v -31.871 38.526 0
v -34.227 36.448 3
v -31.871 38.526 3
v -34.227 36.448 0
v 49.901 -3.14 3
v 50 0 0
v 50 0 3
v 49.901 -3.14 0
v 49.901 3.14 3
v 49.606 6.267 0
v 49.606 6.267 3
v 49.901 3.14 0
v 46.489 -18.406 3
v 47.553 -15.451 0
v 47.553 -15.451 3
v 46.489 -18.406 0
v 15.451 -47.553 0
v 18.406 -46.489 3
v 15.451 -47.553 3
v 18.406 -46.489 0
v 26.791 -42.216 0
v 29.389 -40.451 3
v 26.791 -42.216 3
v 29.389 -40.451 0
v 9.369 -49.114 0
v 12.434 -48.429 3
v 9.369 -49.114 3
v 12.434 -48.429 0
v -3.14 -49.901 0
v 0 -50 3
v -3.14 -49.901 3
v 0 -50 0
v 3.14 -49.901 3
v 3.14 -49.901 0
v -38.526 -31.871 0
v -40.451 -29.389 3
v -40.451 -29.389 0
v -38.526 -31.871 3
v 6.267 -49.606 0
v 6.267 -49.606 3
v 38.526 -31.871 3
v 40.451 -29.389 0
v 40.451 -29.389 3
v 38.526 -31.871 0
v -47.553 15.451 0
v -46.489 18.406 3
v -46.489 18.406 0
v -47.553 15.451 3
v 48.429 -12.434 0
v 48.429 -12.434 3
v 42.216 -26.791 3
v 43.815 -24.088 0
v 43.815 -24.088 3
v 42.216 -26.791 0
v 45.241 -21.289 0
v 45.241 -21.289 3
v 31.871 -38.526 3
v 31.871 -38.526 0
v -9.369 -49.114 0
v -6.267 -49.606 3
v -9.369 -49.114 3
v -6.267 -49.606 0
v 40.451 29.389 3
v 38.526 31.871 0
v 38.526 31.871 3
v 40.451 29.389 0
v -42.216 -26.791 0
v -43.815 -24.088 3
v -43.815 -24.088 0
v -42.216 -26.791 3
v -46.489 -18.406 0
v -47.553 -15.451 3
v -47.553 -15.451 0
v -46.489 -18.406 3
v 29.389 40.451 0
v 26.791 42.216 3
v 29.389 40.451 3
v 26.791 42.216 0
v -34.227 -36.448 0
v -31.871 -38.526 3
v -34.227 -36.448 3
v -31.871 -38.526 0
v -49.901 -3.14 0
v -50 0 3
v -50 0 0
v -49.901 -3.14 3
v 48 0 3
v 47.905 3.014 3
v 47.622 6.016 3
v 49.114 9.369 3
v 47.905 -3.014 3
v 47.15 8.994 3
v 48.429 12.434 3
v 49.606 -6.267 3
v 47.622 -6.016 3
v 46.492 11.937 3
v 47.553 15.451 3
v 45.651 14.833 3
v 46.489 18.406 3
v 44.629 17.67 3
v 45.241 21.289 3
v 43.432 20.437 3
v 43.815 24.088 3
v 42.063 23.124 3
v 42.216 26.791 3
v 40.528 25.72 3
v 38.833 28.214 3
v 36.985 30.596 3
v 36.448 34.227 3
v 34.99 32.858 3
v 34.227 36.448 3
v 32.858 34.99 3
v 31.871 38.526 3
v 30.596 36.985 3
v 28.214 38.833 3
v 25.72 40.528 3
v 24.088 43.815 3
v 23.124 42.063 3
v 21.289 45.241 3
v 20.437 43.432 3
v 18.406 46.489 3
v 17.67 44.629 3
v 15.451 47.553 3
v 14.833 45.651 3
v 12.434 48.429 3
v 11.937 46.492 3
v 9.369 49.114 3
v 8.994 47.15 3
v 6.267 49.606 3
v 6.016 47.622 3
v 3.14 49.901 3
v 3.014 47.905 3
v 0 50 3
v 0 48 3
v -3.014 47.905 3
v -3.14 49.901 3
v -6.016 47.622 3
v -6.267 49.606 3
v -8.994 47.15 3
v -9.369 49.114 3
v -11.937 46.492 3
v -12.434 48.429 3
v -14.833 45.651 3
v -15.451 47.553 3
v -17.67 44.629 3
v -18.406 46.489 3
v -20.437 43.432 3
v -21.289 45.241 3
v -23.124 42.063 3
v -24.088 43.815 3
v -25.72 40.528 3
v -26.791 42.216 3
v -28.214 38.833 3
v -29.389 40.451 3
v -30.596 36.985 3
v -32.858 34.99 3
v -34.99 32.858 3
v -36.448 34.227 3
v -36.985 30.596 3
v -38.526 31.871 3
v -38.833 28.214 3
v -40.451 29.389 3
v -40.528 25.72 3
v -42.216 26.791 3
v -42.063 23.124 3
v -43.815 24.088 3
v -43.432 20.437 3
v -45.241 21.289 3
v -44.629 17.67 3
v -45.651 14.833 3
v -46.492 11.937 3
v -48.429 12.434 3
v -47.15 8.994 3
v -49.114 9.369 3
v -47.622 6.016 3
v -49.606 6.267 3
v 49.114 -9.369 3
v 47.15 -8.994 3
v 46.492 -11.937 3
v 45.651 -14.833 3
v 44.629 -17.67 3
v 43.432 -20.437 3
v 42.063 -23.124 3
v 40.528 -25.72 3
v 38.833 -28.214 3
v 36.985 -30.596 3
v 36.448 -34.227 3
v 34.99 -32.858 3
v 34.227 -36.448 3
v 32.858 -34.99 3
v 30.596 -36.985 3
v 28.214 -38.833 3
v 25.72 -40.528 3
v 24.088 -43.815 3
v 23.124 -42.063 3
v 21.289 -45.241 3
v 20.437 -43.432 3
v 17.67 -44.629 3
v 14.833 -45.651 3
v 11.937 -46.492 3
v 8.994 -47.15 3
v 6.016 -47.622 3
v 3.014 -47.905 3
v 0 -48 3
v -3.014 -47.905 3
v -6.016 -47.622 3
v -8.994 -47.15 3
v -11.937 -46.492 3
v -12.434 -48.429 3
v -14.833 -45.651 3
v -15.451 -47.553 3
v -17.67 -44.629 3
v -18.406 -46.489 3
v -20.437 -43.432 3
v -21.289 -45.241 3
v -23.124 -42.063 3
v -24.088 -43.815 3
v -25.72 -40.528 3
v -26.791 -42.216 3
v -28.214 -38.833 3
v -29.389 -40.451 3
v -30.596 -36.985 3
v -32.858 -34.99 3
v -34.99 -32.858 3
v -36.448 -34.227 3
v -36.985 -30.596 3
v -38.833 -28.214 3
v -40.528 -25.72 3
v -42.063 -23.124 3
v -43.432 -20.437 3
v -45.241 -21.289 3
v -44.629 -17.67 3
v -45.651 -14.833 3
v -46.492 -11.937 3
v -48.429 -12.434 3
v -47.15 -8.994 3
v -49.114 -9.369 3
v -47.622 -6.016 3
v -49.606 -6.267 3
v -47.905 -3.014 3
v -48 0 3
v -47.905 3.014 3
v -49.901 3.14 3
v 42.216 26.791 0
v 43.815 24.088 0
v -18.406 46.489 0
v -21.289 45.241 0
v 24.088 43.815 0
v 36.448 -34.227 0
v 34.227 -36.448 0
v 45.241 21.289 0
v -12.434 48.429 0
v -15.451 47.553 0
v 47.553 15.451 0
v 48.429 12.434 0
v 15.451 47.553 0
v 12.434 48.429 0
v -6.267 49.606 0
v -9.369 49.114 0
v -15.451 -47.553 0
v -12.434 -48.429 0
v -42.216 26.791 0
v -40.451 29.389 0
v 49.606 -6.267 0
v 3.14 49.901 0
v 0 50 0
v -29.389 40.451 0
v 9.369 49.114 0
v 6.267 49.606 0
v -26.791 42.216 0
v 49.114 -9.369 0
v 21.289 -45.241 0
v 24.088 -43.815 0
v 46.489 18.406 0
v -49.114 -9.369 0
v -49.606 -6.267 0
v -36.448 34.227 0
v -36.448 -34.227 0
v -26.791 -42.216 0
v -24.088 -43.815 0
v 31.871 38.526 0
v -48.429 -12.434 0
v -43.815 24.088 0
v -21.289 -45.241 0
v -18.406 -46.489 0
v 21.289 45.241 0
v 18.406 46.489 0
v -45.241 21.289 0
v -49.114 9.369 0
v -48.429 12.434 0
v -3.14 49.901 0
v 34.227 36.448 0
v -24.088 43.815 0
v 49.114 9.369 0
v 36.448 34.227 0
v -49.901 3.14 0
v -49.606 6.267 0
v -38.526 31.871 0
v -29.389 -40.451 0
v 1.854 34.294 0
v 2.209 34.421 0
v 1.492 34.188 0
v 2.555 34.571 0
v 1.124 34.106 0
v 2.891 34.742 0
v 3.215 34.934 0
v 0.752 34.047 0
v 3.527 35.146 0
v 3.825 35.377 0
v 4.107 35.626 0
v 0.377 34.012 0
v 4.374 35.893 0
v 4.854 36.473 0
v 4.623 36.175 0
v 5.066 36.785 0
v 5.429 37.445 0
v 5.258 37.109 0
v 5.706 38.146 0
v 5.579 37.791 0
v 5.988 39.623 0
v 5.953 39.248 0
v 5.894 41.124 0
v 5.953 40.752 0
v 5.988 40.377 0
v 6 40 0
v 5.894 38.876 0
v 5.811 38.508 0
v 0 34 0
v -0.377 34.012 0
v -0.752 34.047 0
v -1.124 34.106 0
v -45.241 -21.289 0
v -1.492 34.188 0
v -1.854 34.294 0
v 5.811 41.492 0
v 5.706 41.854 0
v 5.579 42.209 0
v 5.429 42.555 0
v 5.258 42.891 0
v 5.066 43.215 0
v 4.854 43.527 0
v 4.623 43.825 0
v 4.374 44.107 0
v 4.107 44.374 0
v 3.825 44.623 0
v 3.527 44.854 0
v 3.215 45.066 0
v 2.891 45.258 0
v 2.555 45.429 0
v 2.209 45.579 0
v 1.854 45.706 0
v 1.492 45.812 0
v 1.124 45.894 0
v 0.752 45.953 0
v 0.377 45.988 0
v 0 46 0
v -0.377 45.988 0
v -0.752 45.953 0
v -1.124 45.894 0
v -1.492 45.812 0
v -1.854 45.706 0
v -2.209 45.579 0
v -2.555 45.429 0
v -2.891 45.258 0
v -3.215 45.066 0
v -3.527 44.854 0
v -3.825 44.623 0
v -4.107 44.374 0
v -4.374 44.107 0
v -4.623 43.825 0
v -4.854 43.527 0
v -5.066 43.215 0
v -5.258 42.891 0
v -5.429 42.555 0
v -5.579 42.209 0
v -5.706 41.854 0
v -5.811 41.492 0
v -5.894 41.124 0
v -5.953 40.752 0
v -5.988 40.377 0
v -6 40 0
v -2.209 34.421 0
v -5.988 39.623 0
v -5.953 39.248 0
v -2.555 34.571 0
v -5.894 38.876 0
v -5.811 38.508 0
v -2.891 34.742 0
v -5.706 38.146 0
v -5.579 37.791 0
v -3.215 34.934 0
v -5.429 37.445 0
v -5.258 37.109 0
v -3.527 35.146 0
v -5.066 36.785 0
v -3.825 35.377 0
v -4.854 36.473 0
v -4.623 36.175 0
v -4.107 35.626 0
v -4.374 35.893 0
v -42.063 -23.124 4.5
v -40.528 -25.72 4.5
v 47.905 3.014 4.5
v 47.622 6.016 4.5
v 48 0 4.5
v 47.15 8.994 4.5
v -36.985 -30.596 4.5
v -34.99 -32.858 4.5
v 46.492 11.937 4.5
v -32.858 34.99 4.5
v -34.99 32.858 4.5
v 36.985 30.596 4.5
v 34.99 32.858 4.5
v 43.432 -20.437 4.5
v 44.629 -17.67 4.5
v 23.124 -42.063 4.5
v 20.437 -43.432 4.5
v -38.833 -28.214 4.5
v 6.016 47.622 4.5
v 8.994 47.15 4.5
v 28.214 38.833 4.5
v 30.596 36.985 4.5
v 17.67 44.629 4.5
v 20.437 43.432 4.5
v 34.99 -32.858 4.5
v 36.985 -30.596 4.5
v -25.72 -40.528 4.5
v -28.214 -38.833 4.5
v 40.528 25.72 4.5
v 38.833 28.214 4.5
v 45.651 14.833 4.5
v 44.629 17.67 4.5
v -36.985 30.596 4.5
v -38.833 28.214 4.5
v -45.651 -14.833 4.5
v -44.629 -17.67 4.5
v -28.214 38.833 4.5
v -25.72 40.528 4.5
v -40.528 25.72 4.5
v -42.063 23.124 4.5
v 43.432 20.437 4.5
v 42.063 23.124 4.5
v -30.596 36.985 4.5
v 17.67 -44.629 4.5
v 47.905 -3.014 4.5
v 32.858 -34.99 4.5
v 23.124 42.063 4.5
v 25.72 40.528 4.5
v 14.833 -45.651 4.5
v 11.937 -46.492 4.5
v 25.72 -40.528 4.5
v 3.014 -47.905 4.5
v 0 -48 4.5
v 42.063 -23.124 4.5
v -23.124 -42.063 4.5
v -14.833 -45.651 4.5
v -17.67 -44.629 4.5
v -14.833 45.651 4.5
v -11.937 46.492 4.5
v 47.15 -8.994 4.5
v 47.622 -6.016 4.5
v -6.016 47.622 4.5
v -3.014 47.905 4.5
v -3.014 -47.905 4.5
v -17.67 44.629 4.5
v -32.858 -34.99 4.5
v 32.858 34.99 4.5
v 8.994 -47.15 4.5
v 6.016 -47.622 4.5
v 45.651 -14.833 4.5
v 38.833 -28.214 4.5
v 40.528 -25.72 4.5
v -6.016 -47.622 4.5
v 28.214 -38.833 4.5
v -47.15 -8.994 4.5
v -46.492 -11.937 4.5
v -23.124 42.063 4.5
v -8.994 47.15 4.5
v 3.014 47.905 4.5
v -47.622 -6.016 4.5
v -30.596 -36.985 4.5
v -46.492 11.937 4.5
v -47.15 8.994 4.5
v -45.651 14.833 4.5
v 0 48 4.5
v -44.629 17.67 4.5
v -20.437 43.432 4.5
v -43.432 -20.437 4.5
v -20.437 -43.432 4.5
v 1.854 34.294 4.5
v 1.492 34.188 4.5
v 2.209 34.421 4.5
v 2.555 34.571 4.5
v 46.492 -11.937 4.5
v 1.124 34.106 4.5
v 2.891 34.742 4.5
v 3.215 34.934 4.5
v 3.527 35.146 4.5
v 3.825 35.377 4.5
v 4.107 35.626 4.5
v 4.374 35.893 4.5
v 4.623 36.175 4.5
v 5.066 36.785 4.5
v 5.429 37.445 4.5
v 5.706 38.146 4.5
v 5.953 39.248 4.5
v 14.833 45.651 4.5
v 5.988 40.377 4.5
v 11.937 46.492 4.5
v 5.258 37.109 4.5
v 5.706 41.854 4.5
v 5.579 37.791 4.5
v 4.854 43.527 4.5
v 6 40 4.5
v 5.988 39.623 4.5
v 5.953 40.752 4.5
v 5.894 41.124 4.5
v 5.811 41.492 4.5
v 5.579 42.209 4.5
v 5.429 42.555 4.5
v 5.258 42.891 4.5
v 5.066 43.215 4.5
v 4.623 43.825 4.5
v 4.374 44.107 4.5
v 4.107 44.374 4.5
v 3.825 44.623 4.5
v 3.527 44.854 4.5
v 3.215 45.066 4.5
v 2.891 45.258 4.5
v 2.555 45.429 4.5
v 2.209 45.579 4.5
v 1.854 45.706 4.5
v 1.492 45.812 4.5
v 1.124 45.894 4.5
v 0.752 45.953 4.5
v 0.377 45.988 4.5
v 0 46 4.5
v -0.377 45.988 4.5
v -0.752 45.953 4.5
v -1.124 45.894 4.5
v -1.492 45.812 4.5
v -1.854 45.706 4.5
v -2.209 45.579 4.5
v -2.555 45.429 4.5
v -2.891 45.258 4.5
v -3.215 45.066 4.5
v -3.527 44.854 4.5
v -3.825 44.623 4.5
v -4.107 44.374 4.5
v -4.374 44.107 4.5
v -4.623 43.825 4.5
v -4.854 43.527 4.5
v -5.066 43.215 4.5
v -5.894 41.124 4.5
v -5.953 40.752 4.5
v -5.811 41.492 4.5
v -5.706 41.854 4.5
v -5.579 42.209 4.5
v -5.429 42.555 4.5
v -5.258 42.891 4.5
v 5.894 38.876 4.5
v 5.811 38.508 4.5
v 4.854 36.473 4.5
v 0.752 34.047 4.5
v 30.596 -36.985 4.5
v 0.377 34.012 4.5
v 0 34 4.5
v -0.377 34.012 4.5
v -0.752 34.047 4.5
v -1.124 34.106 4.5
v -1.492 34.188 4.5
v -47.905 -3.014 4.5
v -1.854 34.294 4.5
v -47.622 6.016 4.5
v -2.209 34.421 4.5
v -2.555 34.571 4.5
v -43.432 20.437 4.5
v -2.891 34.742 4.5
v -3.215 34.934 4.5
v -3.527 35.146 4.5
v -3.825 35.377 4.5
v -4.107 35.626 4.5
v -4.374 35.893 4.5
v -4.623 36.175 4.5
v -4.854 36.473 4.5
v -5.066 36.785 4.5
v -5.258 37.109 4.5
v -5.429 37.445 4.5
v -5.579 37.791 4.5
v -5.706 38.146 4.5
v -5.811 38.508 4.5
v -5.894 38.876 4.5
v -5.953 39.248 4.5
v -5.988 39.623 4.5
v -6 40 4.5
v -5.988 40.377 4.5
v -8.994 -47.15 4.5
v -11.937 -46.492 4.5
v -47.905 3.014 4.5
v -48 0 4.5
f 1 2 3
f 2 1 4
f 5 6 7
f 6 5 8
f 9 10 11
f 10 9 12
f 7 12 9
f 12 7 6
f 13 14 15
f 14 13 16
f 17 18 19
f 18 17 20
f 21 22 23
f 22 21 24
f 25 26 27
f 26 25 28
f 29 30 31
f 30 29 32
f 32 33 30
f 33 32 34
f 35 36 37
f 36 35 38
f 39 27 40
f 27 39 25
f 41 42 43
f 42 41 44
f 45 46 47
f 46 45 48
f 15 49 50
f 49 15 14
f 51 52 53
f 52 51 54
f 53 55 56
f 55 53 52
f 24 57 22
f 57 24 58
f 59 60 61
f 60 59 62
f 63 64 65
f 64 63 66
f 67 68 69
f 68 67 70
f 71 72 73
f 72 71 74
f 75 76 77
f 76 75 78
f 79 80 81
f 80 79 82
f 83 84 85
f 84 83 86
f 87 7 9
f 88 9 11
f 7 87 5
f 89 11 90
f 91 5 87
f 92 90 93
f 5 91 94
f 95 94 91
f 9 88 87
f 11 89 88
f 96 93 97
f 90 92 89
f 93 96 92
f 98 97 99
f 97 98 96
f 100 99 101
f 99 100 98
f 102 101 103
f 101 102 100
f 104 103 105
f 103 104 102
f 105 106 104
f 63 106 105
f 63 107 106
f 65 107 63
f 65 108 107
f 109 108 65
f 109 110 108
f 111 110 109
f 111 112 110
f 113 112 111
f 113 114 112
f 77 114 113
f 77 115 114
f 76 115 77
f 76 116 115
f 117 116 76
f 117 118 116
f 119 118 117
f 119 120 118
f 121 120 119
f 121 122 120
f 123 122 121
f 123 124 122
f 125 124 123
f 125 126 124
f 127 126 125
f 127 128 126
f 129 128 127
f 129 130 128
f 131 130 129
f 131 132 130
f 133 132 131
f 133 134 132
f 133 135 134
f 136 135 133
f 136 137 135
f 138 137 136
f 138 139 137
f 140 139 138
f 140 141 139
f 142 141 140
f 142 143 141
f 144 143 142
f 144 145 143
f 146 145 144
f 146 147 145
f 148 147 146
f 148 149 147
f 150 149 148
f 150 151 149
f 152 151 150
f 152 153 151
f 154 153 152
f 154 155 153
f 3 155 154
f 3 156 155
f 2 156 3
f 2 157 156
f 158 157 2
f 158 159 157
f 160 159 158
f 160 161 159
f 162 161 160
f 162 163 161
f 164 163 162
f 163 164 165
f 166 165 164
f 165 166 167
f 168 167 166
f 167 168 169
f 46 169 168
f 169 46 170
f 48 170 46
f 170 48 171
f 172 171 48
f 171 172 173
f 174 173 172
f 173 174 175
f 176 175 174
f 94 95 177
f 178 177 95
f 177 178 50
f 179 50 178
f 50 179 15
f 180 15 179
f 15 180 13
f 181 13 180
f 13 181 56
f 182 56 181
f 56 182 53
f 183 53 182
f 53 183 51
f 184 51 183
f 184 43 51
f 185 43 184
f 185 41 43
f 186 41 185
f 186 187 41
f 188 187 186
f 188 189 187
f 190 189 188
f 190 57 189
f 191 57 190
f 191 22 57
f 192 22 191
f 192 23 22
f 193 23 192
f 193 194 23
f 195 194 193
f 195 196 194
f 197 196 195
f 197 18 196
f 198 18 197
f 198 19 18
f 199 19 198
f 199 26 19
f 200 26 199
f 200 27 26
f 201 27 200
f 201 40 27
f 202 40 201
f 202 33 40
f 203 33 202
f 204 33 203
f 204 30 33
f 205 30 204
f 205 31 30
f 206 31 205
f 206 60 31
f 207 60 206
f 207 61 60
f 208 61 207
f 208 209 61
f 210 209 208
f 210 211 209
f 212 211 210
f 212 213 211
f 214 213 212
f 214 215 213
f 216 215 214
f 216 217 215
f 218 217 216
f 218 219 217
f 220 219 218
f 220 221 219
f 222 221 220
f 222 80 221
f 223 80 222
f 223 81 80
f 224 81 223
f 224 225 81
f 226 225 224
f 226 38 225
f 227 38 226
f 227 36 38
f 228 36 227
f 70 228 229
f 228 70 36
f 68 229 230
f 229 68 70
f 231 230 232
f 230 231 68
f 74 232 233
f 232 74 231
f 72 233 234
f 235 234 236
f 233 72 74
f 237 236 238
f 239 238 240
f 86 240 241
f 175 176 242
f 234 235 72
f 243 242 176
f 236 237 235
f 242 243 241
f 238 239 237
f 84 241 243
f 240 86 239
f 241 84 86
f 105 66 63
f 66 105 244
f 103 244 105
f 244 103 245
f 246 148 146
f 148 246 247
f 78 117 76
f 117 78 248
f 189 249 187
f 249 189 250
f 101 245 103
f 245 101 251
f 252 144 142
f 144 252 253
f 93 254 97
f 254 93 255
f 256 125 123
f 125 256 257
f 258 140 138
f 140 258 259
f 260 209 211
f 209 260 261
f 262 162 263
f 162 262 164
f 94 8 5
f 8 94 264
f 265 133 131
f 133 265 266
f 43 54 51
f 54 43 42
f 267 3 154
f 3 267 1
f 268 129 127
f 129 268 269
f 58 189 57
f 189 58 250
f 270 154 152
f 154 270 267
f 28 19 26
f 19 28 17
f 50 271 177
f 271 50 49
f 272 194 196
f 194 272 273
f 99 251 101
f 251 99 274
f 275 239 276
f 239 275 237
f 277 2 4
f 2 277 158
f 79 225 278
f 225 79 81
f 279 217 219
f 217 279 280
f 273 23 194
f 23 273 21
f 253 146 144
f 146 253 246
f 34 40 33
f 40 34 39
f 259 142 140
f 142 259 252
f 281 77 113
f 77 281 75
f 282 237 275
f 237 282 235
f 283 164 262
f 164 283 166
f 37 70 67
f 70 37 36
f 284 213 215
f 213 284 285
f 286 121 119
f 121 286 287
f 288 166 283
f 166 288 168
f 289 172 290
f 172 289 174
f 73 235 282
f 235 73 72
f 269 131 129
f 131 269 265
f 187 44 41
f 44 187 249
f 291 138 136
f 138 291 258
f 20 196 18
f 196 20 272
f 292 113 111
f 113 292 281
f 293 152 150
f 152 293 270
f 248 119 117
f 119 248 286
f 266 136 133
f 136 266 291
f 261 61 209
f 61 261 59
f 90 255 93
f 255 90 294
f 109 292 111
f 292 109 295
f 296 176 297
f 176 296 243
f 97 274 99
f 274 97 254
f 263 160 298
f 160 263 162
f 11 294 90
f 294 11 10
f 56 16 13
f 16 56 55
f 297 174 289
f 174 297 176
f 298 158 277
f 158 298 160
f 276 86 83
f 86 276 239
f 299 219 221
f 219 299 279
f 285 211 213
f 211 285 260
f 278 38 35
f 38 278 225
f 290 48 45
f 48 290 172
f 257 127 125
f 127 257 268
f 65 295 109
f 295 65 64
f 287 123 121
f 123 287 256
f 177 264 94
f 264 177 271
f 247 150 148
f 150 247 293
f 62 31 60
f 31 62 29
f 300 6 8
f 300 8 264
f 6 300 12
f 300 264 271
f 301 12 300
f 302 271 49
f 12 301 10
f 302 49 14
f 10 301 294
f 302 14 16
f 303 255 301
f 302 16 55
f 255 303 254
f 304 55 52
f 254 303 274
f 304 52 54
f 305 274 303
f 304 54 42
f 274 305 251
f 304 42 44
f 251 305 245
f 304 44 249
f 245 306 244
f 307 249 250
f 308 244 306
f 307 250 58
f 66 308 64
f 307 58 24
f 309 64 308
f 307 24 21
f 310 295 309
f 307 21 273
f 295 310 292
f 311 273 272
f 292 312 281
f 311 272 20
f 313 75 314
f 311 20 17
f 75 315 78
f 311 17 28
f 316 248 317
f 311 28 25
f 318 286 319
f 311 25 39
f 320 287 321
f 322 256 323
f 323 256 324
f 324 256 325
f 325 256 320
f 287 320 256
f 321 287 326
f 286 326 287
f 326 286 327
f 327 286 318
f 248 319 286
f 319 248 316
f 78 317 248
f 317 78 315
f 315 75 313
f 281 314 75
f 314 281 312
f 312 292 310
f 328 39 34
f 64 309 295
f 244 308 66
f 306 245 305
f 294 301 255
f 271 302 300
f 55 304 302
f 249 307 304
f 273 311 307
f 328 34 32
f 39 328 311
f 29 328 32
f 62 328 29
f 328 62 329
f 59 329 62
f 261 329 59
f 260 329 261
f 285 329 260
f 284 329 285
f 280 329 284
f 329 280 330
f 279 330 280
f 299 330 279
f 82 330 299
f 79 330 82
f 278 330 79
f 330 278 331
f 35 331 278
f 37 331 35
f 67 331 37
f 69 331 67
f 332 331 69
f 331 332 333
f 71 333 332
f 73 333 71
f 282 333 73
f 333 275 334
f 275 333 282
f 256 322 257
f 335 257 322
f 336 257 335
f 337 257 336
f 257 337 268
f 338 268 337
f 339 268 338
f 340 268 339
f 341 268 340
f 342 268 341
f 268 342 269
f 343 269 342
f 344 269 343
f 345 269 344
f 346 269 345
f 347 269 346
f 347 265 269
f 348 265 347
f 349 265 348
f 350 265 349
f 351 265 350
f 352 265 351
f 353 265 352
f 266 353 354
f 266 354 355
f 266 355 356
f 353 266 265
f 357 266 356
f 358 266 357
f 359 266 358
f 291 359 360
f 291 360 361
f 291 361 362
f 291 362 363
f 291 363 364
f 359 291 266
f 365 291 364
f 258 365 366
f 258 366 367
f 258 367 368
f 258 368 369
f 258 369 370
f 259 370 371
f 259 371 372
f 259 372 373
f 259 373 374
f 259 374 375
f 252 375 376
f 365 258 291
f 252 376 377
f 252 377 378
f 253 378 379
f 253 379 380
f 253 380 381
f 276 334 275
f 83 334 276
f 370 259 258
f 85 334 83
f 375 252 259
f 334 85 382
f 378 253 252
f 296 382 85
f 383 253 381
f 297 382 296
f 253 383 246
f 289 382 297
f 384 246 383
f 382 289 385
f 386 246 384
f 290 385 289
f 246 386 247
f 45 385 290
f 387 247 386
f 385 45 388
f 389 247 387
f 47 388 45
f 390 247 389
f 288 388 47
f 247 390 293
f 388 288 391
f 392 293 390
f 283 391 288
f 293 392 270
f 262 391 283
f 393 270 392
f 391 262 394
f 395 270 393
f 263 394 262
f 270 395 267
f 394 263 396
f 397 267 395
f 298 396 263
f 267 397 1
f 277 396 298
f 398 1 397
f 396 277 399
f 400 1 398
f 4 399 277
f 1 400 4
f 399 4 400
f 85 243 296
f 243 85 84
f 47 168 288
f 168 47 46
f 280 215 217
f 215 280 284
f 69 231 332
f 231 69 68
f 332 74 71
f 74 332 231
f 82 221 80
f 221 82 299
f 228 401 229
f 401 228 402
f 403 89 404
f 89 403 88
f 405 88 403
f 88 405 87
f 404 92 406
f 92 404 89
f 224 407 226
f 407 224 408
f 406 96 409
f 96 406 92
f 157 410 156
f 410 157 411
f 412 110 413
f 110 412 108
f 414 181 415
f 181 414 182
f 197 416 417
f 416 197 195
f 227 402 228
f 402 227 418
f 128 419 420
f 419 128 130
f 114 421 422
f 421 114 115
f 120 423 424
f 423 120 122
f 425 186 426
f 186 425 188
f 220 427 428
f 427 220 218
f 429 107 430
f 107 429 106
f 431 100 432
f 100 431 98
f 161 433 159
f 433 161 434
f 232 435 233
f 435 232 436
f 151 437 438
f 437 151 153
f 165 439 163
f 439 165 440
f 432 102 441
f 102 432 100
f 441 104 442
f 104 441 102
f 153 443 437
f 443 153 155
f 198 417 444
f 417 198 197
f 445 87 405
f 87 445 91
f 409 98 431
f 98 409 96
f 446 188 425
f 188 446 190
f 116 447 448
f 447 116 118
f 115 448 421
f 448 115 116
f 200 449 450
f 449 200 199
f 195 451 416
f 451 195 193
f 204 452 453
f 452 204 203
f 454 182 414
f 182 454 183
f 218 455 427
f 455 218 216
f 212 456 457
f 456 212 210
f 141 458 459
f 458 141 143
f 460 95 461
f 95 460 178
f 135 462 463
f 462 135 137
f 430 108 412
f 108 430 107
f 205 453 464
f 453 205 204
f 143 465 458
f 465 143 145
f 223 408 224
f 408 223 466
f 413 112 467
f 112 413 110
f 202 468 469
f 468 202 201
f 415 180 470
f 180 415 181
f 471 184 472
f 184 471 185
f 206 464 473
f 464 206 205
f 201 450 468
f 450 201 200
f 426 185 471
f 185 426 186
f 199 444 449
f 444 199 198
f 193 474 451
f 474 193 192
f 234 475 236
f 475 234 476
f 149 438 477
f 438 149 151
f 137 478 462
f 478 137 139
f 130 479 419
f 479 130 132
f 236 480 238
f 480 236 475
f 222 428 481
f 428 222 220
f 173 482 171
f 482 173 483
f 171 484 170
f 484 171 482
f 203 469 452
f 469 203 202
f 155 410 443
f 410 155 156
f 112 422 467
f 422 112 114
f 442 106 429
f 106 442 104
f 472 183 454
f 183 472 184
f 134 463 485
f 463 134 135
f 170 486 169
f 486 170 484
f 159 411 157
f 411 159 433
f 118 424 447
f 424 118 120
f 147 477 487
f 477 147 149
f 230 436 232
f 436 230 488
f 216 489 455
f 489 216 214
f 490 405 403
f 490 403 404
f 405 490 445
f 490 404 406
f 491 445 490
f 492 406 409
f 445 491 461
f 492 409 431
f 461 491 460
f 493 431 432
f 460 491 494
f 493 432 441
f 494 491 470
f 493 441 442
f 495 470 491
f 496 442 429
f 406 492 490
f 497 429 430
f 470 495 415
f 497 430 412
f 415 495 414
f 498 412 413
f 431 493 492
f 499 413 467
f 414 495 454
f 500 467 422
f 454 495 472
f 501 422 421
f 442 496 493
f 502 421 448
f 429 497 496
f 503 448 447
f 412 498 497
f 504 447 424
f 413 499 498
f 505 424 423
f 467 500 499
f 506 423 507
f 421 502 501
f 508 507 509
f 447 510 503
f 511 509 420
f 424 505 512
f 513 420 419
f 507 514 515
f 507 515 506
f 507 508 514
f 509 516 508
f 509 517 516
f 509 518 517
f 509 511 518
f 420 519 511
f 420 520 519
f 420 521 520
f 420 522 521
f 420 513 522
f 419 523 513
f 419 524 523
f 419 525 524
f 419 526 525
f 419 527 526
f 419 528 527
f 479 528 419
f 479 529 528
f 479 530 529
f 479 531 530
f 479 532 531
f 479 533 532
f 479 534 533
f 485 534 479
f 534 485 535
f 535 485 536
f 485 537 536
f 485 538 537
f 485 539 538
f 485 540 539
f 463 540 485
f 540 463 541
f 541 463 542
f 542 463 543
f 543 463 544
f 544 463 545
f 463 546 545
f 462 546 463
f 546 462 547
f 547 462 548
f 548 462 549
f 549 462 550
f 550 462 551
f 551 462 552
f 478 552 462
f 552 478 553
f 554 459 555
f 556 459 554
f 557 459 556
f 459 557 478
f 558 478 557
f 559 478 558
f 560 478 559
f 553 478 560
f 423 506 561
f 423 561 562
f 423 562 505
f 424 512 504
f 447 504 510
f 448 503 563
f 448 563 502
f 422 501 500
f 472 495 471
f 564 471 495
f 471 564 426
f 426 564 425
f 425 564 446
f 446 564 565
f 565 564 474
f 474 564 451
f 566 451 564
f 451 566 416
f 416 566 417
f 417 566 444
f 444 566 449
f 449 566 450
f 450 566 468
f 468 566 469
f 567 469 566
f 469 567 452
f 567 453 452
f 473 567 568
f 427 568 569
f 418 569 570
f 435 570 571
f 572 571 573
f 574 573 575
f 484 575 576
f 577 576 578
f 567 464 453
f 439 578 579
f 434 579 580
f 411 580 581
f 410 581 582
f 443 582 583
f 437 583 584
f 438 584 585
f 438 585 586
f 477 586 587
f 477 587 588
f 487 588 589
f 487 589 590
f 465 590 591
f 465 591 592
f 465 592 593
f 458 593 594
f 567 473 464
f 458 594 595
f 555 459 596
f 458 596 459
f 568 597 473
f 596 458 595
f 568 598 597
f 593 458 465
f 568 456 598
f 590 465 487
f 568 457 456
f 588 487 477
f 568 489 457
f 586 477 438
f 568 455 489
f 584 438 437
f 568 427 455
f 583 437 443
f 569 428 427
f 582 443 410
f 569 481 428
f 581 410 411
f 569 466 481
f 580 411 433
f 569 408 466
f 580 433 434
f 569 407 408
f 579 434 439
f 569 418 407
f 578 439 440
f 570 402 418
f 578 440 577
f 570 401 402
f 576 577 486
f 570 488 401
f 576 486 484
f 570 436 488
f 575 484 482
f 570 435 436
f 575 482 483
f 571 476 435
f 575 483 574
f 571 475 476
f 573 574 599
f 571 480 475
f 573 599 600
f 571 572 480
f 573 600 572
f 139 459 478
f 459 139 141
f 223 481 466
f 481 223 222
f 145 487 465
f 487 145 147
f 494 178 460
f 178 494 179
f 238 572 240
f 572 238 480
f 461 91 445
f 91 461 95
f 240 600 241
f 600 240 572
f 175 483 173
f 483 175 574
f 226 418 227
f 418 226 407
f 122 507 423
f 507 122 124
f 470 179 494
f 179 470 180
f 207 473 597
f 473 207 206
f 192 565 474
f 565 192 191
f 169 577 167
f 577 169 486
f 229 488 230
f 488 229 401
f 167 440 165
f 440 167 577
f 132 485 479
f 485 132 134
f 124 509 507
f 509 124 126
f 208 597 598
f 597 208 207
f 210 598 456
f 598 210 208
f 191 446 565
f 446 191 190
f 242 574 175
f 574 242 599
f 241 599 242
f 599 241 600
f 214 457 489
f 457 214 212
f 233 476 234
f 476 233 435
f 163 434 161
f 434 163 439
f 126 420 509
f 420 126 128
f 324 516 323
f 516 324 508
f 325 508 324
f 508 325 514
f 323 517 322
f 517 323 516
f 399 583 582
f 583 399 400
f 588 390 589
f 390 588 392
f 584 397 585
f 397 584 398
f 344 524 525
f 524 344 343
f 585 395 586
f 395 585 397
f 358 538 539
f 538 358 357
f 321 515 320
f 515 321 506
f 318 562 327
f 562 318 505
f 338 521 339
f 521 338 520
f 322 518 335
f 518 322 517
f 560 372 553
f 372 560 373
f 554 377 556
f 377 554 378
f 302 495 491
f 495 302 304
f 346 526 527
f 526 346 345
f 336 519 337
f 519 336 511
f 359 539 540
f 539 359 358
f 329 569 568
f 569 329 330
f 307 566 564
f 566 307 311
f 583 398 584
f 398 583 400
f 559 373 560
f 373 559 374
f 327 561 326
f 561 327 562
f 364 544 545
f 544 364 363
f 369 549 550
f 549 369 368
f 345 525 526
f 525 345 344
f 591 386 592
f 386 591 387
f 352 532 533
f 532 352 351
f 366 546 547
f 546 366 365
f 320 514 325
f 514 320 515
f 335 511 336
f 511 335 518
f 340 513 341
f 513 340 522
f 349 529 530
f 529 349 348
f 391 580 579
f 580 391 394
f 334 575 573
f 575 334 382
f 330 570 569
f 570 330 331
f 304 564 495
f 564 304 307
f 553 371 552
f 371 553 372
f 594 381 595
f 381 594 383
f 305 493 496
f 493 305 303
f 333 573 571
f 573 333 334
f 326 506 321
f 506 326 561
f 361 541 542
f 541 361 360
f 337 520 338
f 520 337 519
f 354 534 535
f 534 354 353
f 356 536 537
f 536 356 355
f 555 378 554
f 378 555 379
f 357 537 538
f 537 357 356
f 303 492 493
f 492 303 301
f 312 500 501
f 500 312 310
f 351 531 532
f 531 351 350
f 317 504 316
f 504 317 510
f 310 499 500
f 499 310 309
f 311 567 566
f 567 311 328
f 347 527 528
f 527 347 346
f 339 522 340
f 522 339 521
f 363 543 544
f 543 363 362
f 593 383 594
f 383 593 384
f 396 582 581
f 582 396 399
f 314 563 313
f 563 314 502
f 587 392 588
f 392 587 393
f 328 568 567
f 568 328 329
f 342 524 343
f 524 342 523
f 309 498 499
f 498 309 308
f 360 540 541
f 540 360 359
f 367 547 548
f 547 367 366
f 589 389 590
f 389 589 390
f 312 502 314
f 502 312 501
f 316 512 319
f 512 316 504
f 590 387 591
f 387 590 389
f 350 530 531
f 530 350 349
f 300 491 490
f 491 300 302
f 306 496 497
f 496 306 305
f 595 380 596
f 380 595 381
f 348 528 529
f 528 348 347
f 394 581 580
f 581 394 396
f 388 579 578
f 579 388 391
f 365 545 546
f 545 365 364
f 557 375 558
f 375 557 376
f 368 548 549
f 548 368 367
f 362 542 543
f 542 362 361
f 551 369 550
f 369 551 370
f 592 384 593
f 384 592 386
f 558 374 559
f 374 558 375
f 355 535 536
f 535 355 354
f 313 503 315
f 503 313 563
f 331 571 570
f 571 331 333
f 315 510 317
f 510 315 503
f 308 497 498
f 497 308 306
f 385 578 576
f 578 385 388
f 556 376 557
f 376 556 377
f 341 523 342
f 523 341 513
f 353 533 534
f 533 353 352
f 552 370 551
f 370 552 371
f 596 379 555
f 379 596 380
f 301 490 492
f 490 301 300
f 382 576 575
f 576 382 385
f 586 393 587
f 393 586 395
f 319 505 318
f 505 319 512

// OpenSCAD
$fn = 100;

extrude_thickness = 3.0;
lift_height = 3.5;
coroa_lift = 2.9; // Afundada 0.1 mm na base para grudar bem

// Base do chaveiro
module base_chaveiro() {
    color("pink") 
    cylinder(h = 3, r = 50);

    translate([0, 0, 2.98])  // ligeiramente abaixo para evitar sobreposição
    color("white")
    cylinder(h = 1.52, r = 48);
}

// Importando silhueta feminina do arquivo DXF (logo mais afundada ainda)
module silhueta_feminina() {
    color("black")
    translate([-57, -50, 3.6])  // Afundada mais 0.2 mm
    scale([0.33, 0.33, 1])
    linear_extrude(height = extrude_thickness)
    offset(r = 0.2)
    import("logo.dxf", convexity = 12);
}

// Importando coroa do arquivo DXF
module coroa() {
    translate([-70, -34, coroa_lift])
    color("gold")
    linear_extrude(height = extrude_thickness)
    import("coroa.dxf");
}

// Furo para chaveiro
module furo_chaveiro() {
    translate([0, 40, -1]) // Ajuste da posição do furo
    cylinder(h = 8, r = 6);  // Furo ajustado
}

// Resultado final
difference() {
    union() {
        base_chaveiro();
        silhueta_feminina();
        coroa();
    }

    furo_chaveiro();  // Inserir o furo na peça final
}
